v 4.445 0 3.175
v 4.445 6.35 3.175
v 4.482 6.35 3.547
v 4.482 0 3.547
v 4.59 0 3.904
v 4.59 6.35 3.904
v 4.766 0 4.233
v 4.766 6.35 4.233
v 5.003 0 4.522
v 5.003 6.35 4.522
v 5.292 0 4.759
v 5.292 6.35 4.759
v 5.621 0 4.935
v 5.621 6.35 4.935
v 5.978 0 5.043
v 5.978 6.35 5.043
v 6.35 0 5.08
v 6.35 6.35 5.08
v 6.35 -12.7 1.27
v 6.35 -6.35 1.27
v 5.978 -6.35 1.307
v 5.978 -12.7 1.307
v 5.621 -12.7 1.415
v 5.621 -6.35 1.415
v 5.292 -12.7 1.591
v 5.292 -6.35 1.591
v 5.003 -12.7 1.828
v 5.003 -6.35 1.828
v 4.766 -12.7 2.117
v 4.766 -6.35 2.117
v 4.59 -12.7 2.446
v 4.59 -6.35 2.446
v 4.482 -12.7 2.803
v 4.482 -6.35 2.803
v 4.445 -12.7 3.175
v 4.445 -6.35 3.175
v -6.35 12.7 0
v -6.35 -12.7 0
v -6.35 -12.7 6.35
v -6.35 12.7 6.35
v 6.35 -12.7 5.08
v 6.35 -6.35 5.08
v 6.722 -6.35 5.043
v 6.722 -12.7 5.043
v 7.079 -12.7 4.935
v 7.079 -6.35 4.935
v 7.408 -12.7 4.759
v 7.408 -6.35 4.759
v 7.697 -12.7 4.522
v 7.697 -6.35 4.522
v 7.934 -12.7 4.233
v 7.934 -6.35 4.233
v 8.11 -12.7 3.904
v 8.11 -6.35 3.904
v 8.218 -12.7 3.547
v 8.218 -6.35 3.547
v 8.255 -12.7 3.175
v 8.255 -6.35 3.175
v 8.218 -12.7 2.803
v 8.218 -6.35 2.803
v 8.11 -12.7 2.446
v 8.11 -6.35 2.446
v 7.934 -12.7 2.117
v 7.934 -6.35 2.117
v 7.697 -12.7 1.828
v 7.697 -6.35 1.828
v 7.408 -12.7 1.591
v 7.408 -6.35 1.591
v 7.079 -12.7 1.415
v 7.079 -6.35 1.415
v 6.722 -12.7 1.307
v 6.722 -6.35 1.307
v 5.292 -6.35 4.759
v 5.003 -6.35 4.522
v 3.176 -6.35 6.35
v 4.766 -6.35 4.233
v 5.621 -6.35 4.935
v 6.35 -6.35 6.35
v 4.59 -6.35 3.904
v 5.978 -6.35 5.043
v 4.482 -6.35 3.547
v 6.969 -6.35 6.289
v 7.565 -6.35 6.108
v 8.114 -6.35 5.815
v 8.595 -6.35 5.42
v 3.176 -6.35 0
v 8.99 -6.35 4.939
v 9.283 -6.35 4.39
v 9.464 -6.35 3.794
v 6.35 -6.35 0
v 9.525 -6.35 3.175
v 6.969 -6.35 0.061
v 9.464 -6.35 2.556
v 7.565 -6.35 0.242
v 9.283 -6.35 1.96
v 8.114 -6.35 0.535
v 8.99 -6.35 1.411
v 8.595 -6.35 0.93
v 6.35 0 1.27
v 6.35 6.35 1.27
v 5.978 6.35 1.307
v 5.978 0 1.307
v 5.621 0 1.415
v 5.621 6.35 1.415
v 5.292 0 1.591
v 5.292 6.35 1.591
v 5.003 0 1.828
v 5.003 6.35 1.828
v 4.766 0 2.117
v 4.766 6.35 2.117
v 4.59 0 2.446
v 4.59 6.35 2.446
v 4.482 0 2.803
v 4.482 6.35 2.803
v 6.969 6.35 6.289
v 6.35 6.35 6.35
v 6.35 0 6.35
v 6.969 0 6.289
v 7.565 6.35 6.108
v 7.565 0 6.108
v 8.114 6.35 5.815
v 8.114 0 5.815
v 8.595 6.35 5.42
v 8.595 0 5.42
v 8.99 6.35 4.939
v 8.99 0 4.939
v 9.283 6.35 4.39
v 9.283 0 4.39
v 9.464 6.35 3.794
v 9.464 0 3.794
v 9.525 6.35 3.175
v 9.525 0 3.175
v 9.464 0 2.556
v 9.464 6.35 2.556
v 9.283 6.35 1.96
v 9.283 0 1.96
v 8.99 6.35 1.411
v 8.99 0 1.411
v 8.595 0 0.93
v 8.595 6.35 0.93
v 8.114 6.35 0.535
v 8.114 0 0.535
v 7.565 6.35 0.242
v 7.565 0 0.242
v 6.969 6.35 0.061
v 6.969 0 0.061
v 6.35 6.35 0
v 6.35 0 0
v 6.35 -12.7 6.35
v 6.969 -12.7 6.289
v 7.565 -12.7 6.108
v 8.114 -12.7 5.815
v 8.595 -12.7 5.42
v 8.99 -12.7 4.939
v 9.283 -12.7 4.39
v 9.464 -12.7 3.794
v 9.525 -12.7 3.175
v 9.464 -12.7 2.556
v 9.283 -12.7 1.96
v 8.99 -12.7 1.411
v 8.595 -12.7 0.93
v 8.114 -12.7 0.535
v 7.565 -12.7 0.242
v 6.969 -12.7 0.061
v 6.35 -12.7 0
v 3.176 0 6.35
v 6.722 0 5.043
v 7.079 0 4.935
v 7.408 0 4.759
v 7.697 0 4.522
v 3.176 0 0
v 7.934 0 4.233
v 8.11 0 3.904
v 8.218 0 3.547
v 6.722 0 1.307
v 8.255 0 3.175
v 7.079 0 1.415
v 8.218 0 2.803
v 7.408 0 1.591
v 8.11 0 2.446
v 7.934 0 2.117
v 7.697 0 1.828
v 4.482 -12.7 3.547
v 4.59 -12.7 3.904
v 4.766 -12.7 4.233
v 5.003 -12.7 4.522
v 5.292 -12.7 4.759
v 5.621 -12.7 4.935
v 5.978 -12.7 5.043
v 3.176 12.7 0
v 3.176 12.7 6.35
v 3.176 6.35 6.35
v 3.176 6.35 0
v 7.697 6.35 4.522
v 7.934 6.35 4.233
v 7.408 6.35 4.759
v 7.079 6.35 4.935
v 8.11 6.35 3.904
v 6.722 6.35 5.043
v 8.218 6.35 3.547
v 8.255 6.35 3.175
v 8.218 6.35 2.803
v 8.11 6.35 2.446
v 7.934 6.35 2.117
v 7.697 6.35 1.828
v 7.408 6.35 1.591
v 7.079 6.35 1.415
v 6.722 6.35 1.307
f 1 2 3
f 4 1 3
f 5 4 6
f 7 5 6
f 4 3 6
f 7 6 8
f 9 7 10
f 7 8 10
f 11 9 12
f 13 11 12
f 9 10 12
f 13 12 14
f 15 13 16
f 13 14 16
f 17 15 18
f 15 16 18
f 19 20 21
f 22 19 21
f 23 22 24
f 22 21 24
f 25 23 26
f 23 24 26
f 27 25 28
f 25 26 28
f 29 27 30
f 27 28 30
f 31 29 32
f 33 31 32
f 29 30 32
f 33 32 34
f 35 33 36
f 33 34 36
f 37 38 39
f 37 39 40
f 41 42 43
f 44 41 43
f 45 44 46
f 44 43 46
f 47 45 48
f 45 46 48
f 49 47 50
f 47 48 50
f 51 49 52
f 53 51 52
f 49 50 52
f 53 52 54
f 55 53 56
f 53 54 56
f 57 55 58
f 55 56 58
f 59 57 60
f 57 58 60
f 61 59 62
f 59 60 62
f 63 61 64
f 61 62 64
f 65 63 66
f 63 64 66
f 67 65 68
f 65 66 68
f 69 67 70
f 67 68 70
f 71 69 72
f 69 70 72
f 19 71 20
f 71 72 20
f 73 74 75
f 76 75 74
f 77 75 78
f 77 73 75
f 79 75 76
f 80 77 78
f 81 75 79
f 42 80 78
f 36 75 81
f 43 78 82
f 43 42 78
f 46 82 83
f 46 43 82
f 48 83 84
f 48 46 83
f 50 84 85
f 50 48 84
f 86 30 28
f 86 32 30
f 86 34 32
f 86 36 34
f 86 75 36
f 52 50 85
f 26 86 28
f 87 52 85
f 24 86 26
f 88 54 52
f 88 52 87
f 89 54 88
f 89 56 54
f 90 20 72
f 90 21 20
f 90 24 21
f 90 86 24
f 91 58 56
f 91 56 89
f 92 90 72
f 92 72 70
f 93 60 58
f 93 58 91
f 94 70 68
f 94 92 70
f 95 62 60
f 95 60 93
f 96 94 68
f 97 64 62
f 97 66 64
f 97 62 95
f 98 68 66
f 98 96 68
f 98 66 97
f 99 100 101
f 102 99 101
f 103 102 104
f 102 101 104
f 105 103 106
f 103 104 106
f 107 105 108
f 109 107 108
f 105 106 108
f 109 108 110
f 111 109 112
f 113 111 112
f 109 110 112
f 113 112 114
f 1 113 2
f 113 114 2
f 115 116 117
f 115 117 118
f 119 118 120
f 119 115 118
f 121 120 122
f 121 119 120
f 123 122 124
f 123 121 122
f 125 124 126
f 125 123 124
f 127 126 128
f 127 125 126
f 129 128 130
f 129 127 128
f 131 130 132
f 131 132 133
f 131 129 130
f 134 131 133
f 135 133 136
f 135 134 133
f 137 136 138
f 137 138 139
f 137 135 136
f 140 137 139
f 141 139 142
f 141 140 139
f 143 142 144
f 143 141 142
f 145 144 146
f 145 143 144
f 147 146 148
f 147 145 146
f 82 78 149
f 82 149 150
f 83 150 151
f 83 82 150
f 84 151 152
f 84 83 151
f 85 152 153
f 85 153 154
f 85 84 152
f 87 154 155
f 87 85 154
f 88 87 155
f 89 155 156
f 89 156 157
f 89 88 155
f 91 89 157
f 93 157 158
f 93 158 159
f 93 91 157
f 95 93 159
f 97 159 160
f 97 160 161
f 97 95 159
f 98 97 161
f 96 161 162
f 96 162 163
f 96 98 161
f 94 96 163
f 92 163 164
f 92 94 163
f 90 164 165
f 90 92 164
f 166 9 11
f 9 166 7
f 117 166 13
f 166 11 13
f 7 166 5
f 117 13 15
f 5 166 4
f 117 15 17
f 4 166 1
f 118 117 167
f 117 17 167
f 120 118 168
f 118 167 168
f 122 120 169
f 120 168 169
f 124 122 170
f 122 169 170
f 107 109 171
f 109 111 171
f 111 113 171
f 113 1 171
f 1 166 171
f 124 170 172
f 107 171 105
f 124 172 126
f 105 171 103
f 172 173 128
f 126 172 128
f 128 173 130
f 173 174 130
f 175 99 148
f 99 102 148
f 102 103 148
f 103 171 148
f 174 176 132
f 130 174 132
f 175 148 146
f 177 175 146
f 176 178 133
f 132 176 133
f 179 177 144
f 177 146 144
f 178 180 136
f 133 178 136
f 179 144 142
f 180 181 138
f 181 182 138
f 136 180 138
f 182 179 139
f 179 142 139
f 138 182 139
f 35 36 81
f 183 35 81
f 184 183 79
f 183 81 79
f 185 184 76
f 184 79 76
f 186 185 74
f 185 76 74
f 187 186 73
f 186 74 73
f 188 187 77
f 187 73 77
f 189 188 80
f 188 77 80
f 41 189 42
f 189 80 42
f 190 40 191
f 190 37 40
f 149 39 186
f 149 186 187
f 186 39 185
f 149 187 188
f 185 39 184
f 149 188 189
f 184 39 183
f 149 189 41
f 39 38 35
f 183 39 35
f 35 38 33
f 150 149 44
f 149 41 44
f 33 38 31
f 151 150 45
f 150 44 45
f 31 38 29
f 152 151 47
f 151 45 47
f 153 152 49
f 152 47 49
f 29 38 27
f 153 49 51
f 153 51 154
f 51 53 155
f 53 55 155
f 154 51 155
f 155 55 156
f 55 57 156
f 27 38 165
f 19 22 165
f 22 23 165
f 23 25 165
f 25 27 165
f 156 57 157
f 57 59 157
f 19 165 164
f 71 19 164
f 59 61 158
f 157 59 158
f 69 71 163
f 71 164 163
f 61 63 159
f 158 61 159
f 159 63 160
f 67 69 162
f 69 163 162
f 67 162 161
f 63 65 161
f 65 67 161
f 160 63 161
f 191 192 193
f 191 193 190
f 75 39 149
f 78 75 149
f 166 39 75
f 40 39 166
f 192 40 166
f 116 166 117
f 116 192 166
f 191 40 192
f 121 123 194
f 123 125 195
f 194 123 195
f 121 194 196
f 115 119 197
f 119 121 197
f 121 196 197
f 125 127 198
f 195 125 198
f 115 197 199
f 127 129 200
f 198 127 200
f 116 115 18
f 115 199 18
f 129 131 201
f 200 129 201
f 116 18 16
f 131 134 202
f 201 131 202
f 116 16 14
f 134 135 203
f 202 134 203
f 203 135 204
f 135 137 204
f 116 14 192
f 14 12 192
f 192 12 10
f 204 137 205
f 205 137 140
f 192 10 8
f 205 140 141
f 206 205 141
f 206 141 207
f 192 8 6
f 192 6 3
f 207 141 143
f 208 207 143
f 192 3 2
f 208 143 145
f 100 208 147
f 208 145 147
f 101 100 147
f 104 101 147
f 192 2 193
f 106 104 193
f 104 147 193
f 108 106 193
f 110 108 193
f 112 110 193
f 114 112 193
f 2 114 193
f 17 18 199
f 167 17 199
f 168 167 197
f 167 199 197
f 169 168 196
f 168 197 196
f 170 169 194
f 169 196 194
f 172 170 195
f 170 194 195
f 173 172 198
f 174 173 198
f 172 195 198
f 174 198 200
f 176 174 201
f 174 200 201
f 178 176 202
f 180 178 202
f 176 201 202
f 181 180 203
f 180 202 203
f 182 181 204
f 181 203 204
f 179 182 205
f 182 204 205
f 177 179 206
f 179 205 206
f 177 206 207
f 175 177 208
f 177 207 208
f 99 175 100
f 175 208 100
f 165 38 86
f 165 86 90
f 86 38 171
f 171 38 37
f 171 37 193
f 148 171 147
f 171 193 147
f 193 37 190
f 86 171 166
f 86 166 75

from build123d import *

# Parameters (mm, degrees)
F0_W     = 12.7
F0_H     = 25.4
F1_DEPTH = 6.35
F2_R     = 3.175
F2_R_2   = 1.905
F3_DEPTH = 25.4
F4_DEPTH = 25.4
F5_W     = 6.35
F5_H     = 6.35
F6_DEPTH = 25.4


with BuildPart() as f1:
    # F0 (on Top) → F1 (new body)
    with BuildSketch(Plane.XY):
        Rectangle(F0_W, F0_H)
    extrude(amount=F1_DEPTH)

    # F2 (on face) → F3 (join)
    with BuildSketch(Plane(origin=(0, 12.7, 0), x_dir=(-1, 0, 0), z_dir=(0, 1, 0))):
        with Locations((-6.35, 3.175)):
            Circle(F2_R)
        with Locations((-6.35, 3.175)):
            Circle(F2_R_2, mode=Mode.SUBTRACT)
        with BuildLine():
            ThreePointArc((-4.445, 3.175), (-5.0029615818, 4.5220384182), (-6.35, 5.08))
            Line((-6.35, 5.08), (-6.35, 1.27))
            ThreePointArc((-6.35, 1.27), (-5.0029615818, 1.8279615818), (-4.445, 3.175))
        make_face()
    extrude(amount=-F3_DEPTH)

    # F2 (on face) → F4 (cut)
    with BuildSketch(Plane(origin=(0, 12.7, 0), x_dir=(-1, 0, 0), z_dir=(0, 1, 0))):
        with BuildLine():
            ThreePointArc((-4.445, 3.175), (-5.0029615818, 4.5220384182), (-6.35, 5.08))
            Line((-6.35, 5.08), (-6.35, 1.27))
            ThreePointArc((-6.35, 1.27), (-5.0029615818, 1.8279615818), (-4.445, 3.175))
        make_face()
        with BuildLine():
            Line((-6.35, 1.27), (-6.35, 5.08))
            ThreePointArc((-6.35, 5.08), (-8.255, 3.175), (-6.35, 1.27))
        make_face()
    extrude(amount=-F4_DEPTH, mode=Mode.SUBTRACT)

    # F5 (on face) → F6 (cut)
    with BuildSketch(Plane(origin=(0, 0, 0), x_dir=(1, 0, 0), z_dir=(0, 0, -1))):
        Polygon((3.1755000025, -6.35), (3.1755000025, -12.7), (9.5244999975, -12.7), (9.5255000025, -12.7), (9.5255000025, -6.35), align=None)
        with Locations((6.3505000025, 3.175)):
            Rectangle(F5_W, F5_H)
    extrude(amount=-F6_DEPTH, mode=Mode.SUBTRACT)


solid = f1.part
